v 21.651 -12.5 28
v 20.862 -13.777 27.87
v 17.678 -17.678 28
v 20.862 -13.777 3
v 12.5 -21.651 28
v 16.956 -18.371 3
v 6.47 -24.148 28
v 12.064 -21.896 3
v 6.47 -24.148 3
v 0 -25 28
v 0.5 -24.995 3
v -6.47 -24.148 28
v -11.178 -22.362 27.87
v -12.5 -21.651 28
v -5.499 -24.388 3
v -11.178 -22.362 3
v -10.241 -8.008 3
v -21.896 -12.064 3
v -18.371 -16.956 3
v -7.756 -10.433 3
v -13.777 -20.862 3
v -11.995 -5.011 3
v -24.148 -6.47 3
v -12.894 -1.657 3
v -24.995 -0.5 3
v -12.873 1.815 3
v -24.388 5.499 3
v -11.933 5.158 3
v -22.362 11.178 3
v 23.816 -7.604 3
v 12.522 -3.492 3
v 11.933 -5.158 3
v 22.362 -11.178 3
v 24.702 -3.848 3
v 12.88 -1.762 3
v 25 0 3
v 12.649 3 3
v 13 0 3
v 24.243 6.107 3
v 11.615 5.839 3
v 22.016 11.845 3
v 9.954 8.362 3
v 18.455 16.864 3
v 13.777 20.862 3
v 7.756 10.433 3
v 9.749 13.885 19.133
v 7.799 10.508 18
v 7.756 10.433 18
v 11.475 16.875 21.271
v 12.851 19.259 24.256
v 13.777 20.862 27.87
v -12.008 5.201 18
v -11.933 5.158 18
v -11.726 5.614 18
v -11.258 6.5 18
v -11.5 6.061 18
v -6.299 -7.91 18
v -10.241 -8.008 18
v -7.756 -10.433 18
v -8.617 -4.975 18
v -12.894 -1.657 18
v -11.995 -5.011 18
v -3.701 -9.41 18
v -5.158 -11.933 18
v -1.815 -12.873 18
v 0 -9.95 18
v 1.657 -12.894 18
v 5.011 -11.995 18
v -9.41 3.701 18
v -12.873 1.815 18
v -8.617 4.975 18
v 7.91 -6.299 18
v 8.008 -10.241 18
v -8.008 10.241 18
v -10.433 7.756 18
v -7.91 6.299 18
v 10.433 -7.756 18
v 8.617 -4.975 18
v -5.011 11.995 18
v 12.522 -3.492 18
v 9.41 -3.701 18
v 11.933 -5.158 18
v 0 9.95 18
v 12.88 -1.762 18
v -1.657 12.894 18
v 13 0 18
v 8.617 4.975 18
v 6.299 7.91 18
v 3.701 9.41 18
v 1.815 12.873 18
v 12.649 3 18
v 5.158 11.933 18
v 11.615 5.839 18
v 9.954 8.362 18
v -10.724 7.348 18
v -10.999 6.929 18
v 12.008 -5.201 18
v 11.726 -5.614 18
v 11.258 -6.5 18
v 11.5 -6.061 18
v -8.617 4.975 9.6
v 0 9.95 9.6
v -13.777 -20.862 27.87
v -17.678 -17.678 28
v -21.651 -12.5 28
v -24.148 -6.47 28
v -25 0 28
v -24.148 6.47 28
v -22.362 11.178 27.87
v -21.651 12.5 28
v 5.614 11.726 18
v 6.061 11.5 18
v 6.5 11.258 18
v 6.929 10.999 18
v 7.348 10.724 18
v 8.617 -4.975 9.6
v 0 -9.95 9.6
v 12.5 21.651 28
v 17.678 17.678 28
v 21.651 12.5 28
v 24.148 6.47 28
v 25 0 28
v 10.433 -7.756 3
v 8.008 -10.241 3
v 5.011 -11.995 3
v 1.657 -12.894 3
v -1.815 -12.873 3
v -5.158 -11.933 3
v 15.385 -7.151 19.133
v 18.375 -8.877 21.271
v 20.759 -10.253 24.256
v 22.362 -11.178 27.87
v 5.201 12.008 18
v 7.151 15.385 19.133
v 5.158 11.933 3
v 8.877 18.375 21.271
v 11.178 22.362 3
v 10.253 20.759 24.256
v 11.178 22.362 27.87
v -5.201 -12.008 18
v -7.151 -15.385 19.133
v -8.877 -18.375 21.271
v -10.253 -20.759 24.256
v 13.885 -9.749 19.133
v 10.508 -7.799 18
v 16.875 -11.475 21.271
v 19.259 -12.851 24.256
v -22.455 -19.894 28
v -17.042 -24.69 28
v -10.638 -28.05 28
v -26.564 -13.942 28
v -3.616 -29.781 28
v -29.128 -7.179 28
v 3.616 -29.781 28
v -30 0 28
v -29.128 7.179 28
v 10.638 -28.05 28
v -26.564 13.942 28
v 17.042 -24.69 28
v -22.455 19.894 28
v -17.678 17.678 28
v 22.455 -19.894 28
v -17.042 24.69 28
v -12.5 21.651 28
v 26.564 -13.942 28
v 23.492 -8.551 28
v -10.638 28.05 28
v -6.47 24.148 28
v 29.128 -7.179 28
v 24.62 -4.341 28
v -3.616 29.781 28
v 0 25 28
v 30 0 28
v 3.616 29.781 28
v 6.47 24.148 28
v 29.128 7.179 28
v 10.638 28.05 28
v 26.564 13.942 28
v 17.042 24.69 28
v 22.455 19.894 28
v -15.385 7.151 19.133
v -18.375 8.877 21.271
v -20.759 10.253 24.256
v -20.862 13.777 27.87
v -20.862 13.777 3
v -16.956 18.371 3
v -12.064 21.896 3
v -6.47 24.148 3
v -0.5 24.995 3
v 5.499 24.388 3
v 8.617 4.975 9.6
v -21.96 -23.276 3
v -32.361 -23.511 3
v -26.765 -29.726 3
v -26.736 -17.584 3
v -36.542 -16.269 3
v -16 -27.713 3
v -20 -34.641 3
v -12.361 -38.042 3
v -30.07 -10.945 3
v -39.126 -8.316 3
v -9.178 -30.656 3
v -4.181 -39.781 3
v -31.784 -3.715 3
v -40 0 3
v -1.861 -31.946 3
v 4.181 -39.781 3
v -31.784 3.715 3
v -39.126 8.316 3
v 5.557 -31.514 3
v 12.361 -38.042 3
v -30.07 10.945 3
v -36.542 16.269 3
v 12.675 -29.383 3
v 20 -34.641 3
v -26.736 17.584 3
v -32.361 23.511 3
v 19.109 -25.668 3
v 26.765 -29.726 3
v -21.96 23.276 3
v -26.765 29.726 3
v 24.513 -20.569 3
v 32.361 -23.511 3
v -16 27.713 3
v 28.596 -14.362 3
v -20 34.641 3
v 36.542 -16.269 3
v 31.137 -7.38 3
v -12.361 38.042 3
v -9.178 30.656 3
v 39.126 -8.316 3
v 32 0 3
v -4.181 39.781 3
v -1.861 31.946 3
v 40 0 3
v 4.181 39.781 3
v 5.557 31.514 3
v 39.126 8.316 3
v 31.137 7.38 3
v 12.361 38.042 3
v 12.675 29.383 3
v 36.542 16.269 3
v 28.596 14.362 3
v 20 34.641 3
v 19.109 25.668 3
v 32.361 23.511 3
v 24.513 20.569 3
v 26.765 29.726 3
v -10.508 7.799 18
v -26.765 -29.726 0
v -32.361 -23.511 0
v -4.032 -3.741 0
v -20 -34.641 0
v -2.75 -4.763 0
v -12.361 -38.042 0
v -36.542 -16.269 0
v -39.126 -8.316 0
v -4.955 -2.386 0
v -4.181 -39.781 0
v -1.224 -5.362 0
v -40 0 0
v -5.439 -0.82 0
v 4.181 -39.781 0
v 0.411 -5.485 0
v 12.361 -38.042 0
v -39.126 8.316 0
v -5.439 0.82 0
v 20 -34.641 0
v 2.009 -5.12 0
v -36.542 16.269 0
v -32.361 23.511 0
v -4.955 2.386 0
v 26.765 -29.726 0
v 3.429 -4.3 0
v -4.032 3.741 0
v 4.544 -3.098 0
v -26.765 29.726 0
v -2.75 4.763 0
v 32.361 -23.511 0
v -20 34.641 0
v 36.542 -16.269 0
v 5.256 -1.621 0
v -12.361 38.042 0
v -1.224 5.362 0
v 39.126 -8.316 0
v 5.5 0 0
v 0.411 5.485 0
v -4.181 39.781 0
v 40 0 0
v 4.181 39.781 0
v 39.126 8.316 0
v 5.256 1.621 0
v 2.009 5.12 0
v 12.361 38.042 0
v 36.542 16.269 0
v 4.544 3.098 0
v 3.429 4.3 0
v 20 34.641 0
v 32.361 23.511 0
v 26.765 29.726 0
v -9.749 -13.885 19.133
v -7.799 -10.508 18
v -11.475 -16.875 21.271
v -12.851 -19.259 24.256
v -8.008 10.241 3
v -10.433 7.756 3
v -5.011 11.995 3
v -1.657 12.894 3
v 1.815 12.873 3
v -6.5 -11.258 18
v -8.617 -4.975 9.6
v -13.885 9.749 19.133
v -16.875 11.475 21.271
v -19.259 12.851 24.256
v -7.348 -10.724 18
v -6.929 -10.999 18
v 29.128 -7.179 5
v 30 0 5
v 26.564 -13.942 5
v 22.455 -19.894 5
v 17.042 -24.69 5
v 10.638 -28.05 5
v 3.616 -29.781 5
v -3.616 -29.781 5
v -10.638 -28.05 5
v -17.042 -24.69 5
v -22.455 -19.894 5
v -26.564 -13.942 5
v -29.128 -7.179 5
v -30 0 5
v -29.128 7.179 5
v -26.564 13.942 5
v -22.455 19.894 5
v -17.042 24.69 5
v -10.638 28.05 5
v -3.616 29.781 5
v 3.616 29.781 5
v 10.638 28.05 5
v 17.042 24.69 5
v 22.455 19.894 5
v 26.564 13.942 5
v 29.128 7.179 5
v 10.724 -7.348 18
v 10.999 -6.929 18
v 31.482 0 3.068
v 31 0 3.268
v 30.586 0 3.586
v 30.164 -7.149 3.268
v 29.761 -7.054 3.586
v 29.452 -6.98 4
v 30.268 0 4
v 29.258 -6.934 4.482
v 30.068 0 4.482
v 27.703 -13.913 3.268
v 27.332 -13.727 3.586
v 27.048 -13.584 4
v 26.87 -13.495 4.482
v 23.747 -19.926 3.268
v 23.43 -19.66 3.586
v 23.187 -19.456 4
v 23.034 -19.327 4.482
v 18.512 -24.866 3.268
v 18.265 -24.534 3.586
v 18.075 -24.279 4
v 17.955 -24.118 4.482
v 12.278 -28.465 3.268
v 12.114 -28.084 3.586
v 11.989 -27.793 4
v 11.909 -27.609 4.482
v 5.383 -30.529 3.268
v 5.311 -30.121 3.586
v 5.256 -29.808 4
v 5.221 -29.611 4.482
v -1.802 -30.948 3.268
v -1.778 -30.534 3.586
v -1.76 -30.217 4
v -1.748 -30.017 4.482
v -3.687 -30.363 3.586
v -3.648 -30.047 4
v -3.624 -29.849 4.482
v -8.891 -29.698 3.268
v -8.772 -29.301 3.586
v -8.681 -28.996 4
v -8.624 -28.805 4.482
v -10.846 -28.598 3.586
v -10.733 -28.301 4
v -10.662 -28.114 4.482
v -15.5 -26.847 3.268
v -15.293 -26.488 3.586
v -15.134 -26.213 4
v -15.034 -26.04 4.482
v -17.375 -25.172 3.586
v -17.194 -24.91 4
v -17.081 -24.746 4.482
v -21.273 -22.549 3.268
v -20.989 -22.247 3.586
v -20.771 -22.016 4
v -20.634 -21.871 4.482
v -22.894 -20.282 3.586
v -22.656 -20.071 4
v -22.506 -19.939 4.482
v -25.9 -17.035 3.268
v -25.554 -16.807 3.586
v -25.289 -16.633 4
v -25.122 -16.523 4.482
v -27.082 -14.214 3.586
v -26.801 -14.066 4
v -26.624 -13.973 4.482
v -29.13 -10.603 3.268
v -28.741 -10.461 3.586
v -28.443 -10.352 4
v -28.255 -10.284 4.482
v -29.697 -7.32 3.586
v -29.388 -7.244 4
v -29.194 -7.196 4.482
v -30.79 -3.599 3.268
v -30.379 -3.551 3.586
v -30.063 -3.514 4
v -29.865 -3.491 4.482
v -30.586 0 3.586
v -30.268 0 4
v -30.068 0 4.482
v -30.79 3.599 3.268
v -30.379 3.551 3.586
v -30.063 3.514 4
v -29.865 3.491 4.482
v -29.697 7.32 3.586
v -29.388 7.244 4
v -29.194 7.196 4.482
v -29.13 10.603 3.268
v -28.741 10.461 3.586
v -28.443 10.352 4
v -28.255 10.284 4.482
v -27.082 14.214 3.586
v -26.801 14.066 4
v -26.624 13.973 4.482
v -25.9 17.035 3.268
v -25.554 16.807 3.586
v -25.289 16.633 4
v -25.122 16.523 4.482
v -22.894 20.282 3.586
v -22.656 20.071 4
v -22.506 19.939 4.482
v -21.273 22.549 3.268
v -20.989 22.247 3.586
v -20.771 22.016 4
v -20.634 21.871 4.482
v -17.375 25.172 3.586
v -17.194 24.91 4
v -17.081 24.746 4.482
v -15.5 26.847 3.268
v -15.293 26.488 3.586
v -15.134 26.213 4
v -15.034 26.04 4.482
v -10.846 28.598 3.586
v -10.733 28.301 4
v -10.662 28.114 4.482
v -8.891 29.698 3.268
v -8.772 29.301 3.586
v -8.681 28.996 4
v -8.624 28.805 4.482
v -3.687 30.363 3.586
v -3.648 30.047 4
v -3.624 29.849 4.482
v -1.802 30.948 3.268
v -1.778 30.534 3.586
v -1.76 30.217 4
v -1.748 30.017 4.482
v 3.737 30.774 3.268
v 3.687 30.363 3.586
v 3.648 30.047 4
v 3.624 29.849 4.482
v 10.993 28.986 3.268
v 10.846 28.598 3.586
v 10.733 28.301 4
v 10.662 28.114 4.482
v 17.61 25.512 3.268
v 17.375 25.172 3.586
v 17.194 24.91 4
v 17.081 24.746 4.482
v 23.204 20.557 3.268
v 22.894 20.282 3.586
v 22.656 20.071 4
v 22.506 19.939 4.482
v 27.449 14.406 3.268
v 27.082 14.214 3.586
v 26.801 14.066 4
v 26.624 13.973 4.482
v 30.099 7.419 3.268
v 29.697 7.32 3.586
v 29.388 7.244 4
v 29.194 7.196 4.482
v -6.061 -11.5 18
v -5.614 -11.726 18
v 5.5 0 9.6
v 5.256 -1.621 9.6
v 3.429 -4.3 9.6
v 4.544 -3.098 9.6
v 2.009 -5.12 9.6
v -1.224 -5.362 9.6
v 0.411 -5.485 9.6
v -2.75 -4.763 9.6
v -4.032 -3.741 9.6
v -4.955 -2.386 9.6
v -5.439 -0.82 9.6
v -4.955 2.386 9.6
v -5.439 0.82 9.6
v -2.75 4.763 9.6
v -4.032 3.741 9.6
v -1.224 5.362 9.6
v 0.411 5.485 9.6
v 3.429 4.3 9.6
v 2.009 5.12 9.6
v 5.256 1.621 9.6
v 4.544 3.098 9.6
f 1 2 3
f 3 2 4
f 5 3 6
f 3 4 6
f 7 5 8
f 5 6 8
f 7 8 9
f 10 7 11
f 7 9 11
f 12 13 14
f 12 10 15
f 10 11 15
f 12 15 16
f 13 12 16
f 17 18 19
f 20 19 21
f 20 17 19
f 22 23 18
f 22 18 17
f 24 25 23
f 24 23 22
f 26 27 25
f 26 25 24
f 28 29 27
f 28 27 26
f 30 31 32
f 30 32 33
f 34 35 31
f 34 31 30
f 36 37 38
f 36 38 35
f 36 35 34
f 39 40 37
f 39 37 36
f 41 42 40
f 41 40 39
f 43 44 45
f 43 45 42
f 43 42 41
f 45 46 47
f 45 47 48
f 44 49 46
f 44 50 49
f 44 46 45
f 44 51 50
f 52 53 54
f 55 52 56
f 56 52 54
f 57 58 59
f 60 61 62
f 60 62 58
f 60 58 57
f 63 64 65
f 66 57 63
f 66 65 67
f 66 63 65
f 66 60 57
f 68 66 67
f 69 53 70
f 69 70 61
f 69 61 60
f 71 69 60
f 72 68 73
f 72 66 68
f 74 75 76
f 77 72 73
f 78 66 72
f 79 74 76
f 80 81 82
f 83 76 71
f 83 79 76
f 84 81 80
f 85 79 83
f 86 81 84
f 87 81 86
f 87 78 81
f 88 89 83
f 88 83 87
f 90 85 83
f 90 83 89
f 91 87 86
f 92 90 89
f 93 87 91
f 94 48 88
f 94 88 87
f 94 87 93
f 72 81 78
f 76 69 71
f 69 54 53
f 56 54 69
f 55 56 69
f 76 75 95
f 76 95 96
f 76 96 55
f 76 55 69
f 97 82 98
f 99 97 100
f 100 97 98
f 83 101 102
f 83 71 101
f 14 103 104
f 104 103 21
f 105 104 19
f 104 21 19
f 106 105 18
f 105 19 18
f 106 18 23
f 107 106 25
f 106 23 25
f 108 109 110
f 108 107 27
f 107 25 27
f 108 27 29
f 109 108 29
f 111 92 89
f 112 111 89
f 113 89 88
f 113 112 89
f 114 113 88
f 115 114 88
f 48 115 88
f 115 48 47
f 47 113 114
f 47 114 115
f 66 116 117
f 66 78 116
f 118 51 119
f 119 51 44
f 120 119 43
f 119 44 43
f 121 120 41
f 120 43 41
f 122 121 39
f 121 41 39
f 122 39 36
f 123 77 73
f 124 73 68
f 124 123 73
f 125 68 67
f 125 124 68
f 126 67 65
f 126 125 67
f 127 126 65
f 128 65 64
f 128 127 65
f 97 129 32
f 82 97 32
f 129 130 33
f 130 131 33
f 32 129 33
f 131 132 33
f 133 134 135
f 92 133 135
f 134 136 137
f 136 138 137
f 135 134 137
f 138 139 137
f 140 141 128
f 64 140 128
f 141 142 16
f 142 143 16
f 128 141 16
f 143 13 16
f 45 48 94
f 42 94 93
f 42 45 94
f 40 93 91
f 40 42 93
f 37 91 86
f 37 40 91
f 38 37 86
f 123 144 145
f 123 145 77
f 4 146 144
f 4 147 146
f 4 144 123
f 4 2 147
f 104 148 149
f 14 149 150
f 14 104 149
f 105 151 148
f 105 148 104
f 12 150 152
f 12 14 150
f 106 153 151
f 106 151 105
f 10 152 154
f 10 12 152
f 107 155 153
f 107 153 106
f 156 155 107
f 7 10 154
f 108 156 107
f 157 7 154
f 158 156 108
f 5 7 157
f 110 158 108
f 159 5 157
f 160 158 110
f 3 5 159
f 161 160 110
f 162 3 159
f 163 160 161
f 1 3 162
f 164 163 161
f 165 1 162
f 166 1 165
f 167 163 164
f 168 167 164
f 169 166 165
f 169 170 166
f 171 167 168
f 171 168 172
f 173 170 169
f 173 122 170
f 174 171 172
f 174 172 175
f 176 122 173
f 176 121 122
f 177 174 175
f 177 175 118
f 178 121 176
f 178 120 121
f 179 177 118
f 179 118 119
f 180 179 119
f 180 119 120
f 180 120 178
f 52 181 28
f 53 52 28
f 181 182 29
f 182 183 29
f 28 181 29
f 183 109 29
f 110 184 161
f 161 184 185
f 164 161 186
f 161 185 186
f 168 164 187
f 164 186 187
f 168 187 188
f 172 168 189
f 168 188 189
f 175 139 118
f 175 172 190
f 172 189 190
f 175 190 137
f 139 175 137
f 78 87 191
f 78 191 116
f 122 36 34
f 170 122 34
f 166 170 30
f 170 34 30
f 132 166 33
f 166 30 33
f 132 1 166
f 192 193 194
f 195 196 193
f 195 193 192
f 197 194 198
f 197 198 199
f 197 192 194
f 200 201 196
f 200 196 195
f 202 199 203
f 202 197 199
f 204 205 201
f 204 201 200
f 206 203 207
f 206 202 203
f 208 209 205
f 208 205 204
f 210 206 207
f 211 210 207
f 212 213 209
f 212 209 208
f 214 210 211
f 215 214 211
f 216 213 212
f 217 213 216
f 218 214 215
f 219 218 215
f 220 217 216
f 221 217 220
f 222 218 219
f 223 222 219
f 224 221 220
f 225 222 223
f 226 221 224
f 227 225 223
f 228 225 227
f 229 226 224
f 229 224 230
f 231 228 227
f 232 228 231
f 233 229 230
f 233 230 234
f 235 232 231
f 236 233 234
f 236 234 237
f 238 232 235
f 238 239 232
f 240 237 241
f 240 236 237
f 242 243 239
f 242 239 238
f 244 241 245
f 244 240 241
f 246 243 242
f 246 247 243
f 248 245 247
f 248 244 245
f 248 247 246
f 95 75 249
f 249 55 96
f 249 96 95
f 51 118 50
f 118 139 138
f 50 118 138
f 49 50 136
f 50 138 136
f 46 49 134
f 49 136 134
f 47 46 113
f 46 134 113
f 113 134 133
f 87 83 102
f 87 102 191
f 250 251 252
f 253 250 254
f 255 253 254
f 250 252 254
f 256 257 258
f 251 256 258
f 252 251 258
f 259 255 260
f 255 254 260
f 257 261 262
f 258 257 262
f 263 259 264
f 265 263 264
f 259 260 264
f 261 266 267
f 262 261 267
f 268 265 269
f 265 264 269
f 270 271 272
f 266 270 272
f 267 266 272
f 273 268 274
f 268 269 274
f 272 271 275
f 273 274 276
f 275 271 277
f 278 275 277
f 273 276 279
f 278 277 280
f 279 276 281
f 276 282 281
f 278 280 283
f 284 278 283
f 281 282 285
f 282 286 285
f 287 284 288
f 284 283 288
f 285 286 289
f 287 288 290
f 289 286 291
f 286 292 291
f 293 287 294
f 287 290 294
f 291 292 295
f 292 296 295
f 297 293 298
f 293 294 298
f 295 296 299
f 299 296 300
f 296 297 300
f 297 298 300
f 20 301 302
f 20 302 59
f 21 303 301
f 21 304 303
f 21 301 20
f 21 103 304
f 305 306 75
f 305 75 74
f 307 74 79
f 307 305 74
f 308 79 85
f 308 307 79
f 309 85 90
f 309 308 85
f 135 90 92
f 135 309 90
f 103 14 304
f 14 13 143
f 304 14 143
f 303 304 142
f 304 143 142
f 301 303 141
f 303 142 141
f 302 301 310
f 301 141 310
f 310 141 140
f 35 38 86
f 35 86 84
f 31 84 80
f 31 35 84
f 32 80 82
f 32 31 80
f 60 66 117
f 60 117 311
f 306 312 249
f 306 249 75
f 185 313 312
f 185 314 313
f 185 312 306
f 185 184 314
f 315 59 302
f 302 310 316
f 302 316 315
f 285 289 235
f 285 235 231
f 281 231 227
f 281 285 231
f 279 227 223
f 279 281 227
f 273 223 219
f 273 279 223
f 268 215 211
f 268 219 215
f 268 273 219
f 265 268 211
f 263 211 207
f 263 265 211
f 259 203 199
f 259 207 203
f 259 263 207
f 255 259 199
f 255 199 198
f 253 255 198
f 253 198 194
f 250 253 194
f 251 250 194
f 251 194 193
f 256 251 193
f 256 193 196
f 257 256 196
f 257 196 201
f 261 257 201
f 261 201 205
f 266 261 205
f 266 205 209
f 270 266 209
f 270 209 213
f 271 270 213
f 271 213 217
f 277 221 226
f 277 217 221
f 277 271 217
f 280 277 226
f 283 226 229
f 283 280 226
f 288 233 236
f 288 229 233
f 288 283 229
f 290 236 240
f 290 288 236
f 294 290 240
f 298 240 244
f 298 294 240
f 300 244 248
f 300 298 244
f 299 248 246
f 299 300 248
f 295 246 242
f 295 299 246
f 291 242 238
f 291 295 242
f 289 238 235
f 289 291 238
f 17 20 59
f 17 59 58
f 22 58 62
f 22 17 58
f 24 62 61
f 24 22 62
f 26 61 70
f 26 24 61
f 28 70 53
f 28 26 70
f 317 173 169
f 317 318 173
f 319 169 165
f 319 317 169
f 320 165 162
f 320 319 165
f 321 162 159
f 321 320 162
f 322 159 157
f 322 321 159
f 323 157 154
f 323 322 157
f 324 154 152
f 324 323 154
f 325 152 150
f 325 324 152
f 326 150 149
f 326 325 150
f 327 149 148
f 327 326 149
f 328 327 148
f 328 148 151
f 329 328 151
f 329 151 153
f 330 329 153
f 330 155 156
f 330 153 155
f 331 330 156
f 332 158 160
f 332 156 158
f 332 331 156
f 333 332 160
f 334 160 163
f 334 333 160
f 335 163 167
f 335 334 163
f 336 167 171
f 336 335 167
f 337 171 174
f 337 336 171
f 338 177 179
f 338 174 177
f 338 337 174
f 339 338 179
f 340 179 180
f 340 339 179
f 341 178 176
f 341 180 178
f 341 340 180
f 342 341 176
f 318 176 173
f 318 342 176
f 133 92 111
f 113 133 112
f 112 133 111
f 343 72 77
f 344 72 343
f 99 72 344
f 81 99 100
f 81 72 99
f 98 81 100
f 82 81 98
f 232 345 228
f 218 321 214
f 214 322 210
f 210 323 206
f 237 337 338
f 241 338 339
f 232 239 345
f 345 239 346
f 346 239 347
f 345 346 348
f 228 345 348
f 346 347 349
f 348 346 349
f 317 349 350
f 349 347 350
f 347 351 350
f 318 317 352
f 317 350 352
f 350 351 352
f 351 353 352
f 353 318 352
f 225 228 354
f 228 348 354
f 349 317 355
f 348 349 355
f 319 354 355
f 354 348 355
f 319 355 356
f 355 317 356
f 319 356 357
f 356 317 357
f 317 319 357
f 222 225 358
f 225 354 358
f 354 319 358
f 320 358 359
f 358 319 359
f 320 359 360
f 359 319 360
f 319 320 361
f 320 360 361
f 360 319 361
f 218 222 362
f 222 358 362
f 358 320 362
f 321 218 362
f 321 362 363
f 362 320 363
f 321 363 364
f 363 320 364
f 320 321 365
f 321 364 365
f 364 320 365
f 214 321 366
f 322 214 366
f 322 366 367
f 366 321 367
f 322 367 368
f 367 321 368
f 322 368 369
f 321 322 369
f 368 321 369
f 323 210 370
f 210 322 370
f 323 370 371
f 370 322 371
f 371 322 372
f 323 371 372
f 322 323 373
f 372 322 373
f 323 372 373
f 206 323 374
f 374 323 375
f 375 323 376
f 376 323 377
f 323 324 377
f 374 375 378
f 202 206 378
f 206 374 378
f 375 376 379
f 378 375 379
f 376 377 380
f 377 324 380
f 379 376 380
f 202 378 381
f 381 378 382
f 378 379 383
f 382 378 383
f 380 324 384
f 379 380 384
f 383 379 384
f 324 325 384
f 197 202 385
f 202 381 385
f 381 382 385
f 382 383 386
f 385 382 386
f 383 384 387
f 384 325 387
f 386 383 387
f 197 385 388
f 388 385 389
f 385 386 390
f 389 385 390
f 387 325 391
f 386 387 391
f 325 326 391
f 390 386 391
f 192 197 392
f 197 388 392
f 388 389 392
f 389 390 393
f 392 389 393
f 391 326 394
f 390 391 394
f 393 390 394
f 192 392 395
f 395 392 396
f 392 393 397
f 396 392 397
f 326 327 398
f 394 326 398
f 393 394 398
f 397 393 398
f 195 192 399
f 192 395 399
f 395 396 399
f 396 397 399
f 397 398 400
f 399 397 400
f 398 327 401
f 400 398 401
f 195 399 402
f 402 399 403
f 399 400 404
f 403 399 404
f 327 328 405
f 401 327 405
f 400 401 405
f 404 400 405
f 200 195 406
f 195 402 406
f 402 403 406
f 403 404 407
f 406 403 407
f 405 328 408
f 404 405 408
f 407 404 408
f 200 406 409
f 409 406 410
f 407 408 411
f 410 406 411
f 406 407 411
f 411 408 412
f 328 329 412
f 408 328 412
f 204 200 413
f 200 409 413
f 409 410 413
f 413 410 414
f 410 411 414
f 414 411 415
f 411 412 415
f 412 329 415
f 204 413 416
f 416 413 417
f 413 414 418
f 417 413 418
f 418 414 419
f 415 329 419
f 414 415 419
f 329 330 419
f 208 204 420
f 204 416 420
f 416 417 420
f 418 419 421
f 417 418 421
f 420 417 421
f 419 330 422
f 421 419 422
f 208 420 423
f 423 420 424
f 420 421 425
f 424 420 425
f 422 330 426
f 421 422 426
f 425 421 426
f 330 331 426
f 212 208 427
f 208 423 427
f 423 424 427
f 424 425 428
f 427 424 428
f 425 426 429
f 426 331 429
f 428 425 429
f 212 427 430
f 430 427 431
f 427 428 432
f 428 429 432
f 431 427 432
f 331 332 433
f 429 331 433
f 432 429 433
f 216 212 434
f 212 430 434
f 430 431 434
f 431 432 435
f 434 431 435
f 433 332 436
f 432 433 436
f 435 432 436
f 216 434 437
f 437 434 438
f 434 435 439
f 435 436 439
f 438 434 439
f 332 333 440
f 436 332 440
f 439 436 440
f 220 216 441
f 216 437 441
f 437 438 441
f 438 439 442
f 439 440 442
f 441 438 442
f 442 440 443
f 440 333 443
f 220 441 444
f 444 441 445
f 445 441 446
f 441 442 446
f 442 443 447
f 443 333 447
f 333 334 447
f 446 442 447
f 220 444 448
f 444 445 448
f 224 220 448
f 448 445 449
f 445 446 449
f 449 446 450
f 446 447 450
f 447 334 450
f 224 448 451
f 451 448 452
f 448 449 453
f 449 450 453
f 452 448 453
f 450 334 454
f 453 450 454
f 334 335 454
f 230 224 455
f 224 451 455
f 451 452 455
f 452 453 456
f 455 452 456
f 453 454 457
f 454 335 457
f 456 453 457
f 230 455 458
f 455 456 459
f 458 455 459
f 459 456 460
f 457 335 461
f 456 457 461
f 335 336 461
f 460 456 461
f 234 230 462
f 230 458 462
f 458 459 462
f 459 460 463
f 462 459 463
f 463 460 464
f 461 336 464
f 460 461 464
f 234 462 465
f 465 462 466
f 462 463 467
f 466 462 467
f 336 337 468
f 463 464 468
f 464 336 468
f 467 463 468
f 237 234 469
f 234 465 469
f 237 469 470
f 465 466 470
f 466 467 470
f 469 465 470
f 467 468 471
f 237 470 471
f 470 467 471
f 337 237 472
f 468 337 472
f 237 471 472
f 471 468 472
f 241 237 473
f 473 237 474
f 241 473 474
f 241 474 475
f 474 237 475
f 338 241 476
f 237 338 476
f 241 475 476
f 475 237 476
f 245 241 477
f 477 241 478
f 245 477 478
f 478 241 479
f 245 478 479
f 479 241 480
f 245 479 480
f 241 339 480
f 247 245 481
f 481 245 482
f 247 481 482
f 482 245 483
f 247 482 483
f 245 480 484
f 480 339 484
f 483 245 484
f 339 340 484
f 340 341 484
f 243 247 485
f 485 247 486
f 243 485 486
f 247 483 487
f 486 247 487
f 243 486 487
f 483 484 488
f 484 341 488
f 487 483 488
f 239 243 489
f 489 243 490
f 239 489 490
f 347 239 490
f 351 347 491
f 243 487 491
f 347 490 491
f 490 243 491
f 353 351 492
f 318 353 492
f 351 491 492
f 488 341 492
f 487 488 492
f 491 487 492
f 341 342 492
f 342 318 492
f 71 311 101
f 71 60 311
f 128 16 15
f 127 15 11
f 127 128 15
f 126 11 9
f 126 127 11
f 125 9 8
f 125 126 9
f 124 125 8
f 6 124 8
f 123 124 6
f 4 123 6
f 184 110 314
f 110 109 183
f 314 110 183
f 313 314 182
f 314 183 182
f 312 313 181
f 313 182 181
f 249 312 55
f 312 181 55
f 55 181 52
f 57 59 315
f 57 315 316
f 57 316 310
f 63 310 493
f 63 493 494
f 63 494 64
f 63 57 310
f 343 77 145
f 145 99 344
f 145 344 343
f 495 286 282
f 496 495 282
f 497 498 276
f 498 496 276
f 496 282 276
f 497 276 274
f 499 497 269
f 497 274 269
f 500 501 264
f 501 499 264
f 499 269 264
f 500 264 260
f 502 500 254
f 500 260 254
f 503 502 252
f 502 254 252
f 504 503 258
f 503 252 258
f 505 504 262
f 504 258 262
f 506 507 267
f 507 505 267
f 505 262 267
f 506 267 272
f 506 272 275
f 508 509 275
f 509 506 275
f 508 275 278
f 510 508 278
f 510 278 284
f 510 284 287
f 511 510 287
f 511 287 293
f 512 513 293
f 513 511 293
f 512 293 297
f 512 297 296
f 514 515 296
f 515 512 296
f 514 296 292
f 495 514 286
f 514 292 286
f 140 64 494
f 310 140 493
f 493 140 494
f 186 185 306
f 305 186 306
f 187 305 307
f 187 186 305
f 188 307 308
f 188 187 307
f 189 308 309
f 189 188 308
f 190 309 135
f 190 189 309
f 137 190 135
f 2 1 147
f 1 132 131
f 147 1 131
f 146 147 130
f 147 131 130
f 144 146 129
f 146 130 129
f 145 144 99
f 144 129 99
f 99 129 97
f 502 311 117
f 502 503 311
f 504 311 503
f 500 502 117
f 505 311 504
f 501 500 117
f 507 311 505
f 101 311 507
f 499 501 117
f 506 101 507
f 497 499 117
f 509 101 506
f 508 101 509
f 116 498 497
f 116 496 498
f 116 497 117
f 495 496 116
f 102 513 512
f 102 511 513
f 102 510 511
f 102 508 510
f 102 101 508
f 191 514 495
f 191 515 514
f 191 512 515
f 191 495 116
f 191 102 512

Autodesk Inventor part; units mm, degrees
ref_plane "YZ Plane" through (0, 0, 0) normal (1, 0, 0) x (0, 1, 0)
ref_plane "XZ Plane" through (0, 0, 0) normal (0, 1, 0) x (-1, 0, 0)
sketch "Sketch1" plane through (0, 0, 0) normal (0, 0, 1) x (1, 0, 0)
  circle A0 centre (0, 0) radius 30
  circle A1 centre (0, 0) radius 40
  circle A2 centre (0, 0) radius 25
  circle A3 centre (0, 0) radius 13
  circle A4 centre (0, 0) radius 5.5
  circle A5 centre (0, 0) radius 9.95 construction
  line L0 (0, 9.95) -> (8.617, 4.975)
  line L1 (8.617, 4.975) -> (8.617, -4.975)
  line L2 (8.617, -4.975) -> (0, -9.95)
  line L3 (0, -9.95) -> (-8.617, -4.975)
  line L4 (-8.617, -4.975) -> (-8.617, 4.975)
  line L5 (-8.617, 4.975) -> (0, 9.95)
  line L6 (0, 9.95) -> (0, -9.95) construction
  dimension "bolt_head_hub_WAC" = 19.9
  dimension "wheel_diam" = 60
  dimension "d1" = 80
  dimension "d4" = 50
  dimension "d5" = 26
  dimension "hub_id" = 11
extrude "Extrusion1" add sketch "Sketch1" along normal blind 3 contours A0 | A1 | A2 | A3 | A4 | L0 L1 L2 L3 L4 L5
extrude "Extrusion2" add sketch "Sketch1" along normal blind 28 contours A0
extrude "Extrusion3" add sketch "Sketch1" along normal blind 18 contours A3 | L0 L1 L2 L3 L4 L5
extrude "Extrusion4" cut sketch "Sketch1" against normal blind 8.4 from surface at 18 contours L0 L1 L2 L3 L4 L5
extrude "Extrusion5" cut sketch "Sketch1" along normal up to surface (3 mm away) contours A4
fillet "Fillet1" radius 2 1 edges at (-30, 0, 3)
ref_plane "Work Plane1" through (-8.617, 4.975, 0) normal (-0.5, -0.8660254, 0) x (0, 0, -1)
sketch "Sketch3" plane through (-8.617, 4.975, 0) normal (-0.5, -0.8660254, 0) x (0, 0, -1)
  line L0 (-3, 22.95) -> (-18, 22.95) projected
  line L1 (-3, 34.95) -> (-3, -15.05) projected
  line L2 (-3, -3.05) -> (-3, 22.95) projected
  line L3 (-28, 34.95) -> (-3, 34.95) projected
  line L4 (-18, 22.95) -> (-3, 22.95)
  line L5 (-3, 22.95) -> (-3, 19.95)
  line L6 (-3, 19.95) -> (-18, 19.95)
  line L7 (-18, 19.95) -> (-18, 22.95)
  arc A0 (-18, 22.95) -> (-28, 34.95) centre (-32.838, 20.7516) ccw
  point P0 (0, 9.95)
  dimension "d18" = 3
  dimension "d21" = 15
extrude "Extrusion6" add sketch "Sketch3" along normal mid plane 3
pattern_circular "Circular Pattern1" count 4 over 360 about axis through (0, 0, -10) along (0, 0, 1) of "Extrusion6"
equation "\"bolt_head_hub_WAC\" = bolt_WAC + 2 * printer_tolerance"
equation "\"d1\" = wheel_diam + 2 * flange_extra"
equation "\"d4\" = wheel_diam - 2 * wheel_thick"
equation "\"d5\" = bolt_head_hub_WAC + 2 * bolt_head_hub_clearance"
equation "\"hub_id\" = bolt_od + 2 * printer_tolerance"
equation "\"d8\" = track_w + flange_w"
equation "\"d10\" = flange_w + hub_height"
equation "\"track_w\" = 25"
equation "\"wheel_thick\" = 5"
equation "\"bolt_head_hub_clearance\" = 3.05"
equation "\"hub_height\" = 15"
equation "\"bolt_head_thick\" = 6.4"
equation "\"bolt_WAC\" = 18.9"
equation "\"printer_tolerance\" = 0.5"
equation "\"flange_extra\" = 10"
equation "\"bolt_od\" = 10"
equation "\"flange_w\" = 3"
properties part number "test_wheel_v1"
